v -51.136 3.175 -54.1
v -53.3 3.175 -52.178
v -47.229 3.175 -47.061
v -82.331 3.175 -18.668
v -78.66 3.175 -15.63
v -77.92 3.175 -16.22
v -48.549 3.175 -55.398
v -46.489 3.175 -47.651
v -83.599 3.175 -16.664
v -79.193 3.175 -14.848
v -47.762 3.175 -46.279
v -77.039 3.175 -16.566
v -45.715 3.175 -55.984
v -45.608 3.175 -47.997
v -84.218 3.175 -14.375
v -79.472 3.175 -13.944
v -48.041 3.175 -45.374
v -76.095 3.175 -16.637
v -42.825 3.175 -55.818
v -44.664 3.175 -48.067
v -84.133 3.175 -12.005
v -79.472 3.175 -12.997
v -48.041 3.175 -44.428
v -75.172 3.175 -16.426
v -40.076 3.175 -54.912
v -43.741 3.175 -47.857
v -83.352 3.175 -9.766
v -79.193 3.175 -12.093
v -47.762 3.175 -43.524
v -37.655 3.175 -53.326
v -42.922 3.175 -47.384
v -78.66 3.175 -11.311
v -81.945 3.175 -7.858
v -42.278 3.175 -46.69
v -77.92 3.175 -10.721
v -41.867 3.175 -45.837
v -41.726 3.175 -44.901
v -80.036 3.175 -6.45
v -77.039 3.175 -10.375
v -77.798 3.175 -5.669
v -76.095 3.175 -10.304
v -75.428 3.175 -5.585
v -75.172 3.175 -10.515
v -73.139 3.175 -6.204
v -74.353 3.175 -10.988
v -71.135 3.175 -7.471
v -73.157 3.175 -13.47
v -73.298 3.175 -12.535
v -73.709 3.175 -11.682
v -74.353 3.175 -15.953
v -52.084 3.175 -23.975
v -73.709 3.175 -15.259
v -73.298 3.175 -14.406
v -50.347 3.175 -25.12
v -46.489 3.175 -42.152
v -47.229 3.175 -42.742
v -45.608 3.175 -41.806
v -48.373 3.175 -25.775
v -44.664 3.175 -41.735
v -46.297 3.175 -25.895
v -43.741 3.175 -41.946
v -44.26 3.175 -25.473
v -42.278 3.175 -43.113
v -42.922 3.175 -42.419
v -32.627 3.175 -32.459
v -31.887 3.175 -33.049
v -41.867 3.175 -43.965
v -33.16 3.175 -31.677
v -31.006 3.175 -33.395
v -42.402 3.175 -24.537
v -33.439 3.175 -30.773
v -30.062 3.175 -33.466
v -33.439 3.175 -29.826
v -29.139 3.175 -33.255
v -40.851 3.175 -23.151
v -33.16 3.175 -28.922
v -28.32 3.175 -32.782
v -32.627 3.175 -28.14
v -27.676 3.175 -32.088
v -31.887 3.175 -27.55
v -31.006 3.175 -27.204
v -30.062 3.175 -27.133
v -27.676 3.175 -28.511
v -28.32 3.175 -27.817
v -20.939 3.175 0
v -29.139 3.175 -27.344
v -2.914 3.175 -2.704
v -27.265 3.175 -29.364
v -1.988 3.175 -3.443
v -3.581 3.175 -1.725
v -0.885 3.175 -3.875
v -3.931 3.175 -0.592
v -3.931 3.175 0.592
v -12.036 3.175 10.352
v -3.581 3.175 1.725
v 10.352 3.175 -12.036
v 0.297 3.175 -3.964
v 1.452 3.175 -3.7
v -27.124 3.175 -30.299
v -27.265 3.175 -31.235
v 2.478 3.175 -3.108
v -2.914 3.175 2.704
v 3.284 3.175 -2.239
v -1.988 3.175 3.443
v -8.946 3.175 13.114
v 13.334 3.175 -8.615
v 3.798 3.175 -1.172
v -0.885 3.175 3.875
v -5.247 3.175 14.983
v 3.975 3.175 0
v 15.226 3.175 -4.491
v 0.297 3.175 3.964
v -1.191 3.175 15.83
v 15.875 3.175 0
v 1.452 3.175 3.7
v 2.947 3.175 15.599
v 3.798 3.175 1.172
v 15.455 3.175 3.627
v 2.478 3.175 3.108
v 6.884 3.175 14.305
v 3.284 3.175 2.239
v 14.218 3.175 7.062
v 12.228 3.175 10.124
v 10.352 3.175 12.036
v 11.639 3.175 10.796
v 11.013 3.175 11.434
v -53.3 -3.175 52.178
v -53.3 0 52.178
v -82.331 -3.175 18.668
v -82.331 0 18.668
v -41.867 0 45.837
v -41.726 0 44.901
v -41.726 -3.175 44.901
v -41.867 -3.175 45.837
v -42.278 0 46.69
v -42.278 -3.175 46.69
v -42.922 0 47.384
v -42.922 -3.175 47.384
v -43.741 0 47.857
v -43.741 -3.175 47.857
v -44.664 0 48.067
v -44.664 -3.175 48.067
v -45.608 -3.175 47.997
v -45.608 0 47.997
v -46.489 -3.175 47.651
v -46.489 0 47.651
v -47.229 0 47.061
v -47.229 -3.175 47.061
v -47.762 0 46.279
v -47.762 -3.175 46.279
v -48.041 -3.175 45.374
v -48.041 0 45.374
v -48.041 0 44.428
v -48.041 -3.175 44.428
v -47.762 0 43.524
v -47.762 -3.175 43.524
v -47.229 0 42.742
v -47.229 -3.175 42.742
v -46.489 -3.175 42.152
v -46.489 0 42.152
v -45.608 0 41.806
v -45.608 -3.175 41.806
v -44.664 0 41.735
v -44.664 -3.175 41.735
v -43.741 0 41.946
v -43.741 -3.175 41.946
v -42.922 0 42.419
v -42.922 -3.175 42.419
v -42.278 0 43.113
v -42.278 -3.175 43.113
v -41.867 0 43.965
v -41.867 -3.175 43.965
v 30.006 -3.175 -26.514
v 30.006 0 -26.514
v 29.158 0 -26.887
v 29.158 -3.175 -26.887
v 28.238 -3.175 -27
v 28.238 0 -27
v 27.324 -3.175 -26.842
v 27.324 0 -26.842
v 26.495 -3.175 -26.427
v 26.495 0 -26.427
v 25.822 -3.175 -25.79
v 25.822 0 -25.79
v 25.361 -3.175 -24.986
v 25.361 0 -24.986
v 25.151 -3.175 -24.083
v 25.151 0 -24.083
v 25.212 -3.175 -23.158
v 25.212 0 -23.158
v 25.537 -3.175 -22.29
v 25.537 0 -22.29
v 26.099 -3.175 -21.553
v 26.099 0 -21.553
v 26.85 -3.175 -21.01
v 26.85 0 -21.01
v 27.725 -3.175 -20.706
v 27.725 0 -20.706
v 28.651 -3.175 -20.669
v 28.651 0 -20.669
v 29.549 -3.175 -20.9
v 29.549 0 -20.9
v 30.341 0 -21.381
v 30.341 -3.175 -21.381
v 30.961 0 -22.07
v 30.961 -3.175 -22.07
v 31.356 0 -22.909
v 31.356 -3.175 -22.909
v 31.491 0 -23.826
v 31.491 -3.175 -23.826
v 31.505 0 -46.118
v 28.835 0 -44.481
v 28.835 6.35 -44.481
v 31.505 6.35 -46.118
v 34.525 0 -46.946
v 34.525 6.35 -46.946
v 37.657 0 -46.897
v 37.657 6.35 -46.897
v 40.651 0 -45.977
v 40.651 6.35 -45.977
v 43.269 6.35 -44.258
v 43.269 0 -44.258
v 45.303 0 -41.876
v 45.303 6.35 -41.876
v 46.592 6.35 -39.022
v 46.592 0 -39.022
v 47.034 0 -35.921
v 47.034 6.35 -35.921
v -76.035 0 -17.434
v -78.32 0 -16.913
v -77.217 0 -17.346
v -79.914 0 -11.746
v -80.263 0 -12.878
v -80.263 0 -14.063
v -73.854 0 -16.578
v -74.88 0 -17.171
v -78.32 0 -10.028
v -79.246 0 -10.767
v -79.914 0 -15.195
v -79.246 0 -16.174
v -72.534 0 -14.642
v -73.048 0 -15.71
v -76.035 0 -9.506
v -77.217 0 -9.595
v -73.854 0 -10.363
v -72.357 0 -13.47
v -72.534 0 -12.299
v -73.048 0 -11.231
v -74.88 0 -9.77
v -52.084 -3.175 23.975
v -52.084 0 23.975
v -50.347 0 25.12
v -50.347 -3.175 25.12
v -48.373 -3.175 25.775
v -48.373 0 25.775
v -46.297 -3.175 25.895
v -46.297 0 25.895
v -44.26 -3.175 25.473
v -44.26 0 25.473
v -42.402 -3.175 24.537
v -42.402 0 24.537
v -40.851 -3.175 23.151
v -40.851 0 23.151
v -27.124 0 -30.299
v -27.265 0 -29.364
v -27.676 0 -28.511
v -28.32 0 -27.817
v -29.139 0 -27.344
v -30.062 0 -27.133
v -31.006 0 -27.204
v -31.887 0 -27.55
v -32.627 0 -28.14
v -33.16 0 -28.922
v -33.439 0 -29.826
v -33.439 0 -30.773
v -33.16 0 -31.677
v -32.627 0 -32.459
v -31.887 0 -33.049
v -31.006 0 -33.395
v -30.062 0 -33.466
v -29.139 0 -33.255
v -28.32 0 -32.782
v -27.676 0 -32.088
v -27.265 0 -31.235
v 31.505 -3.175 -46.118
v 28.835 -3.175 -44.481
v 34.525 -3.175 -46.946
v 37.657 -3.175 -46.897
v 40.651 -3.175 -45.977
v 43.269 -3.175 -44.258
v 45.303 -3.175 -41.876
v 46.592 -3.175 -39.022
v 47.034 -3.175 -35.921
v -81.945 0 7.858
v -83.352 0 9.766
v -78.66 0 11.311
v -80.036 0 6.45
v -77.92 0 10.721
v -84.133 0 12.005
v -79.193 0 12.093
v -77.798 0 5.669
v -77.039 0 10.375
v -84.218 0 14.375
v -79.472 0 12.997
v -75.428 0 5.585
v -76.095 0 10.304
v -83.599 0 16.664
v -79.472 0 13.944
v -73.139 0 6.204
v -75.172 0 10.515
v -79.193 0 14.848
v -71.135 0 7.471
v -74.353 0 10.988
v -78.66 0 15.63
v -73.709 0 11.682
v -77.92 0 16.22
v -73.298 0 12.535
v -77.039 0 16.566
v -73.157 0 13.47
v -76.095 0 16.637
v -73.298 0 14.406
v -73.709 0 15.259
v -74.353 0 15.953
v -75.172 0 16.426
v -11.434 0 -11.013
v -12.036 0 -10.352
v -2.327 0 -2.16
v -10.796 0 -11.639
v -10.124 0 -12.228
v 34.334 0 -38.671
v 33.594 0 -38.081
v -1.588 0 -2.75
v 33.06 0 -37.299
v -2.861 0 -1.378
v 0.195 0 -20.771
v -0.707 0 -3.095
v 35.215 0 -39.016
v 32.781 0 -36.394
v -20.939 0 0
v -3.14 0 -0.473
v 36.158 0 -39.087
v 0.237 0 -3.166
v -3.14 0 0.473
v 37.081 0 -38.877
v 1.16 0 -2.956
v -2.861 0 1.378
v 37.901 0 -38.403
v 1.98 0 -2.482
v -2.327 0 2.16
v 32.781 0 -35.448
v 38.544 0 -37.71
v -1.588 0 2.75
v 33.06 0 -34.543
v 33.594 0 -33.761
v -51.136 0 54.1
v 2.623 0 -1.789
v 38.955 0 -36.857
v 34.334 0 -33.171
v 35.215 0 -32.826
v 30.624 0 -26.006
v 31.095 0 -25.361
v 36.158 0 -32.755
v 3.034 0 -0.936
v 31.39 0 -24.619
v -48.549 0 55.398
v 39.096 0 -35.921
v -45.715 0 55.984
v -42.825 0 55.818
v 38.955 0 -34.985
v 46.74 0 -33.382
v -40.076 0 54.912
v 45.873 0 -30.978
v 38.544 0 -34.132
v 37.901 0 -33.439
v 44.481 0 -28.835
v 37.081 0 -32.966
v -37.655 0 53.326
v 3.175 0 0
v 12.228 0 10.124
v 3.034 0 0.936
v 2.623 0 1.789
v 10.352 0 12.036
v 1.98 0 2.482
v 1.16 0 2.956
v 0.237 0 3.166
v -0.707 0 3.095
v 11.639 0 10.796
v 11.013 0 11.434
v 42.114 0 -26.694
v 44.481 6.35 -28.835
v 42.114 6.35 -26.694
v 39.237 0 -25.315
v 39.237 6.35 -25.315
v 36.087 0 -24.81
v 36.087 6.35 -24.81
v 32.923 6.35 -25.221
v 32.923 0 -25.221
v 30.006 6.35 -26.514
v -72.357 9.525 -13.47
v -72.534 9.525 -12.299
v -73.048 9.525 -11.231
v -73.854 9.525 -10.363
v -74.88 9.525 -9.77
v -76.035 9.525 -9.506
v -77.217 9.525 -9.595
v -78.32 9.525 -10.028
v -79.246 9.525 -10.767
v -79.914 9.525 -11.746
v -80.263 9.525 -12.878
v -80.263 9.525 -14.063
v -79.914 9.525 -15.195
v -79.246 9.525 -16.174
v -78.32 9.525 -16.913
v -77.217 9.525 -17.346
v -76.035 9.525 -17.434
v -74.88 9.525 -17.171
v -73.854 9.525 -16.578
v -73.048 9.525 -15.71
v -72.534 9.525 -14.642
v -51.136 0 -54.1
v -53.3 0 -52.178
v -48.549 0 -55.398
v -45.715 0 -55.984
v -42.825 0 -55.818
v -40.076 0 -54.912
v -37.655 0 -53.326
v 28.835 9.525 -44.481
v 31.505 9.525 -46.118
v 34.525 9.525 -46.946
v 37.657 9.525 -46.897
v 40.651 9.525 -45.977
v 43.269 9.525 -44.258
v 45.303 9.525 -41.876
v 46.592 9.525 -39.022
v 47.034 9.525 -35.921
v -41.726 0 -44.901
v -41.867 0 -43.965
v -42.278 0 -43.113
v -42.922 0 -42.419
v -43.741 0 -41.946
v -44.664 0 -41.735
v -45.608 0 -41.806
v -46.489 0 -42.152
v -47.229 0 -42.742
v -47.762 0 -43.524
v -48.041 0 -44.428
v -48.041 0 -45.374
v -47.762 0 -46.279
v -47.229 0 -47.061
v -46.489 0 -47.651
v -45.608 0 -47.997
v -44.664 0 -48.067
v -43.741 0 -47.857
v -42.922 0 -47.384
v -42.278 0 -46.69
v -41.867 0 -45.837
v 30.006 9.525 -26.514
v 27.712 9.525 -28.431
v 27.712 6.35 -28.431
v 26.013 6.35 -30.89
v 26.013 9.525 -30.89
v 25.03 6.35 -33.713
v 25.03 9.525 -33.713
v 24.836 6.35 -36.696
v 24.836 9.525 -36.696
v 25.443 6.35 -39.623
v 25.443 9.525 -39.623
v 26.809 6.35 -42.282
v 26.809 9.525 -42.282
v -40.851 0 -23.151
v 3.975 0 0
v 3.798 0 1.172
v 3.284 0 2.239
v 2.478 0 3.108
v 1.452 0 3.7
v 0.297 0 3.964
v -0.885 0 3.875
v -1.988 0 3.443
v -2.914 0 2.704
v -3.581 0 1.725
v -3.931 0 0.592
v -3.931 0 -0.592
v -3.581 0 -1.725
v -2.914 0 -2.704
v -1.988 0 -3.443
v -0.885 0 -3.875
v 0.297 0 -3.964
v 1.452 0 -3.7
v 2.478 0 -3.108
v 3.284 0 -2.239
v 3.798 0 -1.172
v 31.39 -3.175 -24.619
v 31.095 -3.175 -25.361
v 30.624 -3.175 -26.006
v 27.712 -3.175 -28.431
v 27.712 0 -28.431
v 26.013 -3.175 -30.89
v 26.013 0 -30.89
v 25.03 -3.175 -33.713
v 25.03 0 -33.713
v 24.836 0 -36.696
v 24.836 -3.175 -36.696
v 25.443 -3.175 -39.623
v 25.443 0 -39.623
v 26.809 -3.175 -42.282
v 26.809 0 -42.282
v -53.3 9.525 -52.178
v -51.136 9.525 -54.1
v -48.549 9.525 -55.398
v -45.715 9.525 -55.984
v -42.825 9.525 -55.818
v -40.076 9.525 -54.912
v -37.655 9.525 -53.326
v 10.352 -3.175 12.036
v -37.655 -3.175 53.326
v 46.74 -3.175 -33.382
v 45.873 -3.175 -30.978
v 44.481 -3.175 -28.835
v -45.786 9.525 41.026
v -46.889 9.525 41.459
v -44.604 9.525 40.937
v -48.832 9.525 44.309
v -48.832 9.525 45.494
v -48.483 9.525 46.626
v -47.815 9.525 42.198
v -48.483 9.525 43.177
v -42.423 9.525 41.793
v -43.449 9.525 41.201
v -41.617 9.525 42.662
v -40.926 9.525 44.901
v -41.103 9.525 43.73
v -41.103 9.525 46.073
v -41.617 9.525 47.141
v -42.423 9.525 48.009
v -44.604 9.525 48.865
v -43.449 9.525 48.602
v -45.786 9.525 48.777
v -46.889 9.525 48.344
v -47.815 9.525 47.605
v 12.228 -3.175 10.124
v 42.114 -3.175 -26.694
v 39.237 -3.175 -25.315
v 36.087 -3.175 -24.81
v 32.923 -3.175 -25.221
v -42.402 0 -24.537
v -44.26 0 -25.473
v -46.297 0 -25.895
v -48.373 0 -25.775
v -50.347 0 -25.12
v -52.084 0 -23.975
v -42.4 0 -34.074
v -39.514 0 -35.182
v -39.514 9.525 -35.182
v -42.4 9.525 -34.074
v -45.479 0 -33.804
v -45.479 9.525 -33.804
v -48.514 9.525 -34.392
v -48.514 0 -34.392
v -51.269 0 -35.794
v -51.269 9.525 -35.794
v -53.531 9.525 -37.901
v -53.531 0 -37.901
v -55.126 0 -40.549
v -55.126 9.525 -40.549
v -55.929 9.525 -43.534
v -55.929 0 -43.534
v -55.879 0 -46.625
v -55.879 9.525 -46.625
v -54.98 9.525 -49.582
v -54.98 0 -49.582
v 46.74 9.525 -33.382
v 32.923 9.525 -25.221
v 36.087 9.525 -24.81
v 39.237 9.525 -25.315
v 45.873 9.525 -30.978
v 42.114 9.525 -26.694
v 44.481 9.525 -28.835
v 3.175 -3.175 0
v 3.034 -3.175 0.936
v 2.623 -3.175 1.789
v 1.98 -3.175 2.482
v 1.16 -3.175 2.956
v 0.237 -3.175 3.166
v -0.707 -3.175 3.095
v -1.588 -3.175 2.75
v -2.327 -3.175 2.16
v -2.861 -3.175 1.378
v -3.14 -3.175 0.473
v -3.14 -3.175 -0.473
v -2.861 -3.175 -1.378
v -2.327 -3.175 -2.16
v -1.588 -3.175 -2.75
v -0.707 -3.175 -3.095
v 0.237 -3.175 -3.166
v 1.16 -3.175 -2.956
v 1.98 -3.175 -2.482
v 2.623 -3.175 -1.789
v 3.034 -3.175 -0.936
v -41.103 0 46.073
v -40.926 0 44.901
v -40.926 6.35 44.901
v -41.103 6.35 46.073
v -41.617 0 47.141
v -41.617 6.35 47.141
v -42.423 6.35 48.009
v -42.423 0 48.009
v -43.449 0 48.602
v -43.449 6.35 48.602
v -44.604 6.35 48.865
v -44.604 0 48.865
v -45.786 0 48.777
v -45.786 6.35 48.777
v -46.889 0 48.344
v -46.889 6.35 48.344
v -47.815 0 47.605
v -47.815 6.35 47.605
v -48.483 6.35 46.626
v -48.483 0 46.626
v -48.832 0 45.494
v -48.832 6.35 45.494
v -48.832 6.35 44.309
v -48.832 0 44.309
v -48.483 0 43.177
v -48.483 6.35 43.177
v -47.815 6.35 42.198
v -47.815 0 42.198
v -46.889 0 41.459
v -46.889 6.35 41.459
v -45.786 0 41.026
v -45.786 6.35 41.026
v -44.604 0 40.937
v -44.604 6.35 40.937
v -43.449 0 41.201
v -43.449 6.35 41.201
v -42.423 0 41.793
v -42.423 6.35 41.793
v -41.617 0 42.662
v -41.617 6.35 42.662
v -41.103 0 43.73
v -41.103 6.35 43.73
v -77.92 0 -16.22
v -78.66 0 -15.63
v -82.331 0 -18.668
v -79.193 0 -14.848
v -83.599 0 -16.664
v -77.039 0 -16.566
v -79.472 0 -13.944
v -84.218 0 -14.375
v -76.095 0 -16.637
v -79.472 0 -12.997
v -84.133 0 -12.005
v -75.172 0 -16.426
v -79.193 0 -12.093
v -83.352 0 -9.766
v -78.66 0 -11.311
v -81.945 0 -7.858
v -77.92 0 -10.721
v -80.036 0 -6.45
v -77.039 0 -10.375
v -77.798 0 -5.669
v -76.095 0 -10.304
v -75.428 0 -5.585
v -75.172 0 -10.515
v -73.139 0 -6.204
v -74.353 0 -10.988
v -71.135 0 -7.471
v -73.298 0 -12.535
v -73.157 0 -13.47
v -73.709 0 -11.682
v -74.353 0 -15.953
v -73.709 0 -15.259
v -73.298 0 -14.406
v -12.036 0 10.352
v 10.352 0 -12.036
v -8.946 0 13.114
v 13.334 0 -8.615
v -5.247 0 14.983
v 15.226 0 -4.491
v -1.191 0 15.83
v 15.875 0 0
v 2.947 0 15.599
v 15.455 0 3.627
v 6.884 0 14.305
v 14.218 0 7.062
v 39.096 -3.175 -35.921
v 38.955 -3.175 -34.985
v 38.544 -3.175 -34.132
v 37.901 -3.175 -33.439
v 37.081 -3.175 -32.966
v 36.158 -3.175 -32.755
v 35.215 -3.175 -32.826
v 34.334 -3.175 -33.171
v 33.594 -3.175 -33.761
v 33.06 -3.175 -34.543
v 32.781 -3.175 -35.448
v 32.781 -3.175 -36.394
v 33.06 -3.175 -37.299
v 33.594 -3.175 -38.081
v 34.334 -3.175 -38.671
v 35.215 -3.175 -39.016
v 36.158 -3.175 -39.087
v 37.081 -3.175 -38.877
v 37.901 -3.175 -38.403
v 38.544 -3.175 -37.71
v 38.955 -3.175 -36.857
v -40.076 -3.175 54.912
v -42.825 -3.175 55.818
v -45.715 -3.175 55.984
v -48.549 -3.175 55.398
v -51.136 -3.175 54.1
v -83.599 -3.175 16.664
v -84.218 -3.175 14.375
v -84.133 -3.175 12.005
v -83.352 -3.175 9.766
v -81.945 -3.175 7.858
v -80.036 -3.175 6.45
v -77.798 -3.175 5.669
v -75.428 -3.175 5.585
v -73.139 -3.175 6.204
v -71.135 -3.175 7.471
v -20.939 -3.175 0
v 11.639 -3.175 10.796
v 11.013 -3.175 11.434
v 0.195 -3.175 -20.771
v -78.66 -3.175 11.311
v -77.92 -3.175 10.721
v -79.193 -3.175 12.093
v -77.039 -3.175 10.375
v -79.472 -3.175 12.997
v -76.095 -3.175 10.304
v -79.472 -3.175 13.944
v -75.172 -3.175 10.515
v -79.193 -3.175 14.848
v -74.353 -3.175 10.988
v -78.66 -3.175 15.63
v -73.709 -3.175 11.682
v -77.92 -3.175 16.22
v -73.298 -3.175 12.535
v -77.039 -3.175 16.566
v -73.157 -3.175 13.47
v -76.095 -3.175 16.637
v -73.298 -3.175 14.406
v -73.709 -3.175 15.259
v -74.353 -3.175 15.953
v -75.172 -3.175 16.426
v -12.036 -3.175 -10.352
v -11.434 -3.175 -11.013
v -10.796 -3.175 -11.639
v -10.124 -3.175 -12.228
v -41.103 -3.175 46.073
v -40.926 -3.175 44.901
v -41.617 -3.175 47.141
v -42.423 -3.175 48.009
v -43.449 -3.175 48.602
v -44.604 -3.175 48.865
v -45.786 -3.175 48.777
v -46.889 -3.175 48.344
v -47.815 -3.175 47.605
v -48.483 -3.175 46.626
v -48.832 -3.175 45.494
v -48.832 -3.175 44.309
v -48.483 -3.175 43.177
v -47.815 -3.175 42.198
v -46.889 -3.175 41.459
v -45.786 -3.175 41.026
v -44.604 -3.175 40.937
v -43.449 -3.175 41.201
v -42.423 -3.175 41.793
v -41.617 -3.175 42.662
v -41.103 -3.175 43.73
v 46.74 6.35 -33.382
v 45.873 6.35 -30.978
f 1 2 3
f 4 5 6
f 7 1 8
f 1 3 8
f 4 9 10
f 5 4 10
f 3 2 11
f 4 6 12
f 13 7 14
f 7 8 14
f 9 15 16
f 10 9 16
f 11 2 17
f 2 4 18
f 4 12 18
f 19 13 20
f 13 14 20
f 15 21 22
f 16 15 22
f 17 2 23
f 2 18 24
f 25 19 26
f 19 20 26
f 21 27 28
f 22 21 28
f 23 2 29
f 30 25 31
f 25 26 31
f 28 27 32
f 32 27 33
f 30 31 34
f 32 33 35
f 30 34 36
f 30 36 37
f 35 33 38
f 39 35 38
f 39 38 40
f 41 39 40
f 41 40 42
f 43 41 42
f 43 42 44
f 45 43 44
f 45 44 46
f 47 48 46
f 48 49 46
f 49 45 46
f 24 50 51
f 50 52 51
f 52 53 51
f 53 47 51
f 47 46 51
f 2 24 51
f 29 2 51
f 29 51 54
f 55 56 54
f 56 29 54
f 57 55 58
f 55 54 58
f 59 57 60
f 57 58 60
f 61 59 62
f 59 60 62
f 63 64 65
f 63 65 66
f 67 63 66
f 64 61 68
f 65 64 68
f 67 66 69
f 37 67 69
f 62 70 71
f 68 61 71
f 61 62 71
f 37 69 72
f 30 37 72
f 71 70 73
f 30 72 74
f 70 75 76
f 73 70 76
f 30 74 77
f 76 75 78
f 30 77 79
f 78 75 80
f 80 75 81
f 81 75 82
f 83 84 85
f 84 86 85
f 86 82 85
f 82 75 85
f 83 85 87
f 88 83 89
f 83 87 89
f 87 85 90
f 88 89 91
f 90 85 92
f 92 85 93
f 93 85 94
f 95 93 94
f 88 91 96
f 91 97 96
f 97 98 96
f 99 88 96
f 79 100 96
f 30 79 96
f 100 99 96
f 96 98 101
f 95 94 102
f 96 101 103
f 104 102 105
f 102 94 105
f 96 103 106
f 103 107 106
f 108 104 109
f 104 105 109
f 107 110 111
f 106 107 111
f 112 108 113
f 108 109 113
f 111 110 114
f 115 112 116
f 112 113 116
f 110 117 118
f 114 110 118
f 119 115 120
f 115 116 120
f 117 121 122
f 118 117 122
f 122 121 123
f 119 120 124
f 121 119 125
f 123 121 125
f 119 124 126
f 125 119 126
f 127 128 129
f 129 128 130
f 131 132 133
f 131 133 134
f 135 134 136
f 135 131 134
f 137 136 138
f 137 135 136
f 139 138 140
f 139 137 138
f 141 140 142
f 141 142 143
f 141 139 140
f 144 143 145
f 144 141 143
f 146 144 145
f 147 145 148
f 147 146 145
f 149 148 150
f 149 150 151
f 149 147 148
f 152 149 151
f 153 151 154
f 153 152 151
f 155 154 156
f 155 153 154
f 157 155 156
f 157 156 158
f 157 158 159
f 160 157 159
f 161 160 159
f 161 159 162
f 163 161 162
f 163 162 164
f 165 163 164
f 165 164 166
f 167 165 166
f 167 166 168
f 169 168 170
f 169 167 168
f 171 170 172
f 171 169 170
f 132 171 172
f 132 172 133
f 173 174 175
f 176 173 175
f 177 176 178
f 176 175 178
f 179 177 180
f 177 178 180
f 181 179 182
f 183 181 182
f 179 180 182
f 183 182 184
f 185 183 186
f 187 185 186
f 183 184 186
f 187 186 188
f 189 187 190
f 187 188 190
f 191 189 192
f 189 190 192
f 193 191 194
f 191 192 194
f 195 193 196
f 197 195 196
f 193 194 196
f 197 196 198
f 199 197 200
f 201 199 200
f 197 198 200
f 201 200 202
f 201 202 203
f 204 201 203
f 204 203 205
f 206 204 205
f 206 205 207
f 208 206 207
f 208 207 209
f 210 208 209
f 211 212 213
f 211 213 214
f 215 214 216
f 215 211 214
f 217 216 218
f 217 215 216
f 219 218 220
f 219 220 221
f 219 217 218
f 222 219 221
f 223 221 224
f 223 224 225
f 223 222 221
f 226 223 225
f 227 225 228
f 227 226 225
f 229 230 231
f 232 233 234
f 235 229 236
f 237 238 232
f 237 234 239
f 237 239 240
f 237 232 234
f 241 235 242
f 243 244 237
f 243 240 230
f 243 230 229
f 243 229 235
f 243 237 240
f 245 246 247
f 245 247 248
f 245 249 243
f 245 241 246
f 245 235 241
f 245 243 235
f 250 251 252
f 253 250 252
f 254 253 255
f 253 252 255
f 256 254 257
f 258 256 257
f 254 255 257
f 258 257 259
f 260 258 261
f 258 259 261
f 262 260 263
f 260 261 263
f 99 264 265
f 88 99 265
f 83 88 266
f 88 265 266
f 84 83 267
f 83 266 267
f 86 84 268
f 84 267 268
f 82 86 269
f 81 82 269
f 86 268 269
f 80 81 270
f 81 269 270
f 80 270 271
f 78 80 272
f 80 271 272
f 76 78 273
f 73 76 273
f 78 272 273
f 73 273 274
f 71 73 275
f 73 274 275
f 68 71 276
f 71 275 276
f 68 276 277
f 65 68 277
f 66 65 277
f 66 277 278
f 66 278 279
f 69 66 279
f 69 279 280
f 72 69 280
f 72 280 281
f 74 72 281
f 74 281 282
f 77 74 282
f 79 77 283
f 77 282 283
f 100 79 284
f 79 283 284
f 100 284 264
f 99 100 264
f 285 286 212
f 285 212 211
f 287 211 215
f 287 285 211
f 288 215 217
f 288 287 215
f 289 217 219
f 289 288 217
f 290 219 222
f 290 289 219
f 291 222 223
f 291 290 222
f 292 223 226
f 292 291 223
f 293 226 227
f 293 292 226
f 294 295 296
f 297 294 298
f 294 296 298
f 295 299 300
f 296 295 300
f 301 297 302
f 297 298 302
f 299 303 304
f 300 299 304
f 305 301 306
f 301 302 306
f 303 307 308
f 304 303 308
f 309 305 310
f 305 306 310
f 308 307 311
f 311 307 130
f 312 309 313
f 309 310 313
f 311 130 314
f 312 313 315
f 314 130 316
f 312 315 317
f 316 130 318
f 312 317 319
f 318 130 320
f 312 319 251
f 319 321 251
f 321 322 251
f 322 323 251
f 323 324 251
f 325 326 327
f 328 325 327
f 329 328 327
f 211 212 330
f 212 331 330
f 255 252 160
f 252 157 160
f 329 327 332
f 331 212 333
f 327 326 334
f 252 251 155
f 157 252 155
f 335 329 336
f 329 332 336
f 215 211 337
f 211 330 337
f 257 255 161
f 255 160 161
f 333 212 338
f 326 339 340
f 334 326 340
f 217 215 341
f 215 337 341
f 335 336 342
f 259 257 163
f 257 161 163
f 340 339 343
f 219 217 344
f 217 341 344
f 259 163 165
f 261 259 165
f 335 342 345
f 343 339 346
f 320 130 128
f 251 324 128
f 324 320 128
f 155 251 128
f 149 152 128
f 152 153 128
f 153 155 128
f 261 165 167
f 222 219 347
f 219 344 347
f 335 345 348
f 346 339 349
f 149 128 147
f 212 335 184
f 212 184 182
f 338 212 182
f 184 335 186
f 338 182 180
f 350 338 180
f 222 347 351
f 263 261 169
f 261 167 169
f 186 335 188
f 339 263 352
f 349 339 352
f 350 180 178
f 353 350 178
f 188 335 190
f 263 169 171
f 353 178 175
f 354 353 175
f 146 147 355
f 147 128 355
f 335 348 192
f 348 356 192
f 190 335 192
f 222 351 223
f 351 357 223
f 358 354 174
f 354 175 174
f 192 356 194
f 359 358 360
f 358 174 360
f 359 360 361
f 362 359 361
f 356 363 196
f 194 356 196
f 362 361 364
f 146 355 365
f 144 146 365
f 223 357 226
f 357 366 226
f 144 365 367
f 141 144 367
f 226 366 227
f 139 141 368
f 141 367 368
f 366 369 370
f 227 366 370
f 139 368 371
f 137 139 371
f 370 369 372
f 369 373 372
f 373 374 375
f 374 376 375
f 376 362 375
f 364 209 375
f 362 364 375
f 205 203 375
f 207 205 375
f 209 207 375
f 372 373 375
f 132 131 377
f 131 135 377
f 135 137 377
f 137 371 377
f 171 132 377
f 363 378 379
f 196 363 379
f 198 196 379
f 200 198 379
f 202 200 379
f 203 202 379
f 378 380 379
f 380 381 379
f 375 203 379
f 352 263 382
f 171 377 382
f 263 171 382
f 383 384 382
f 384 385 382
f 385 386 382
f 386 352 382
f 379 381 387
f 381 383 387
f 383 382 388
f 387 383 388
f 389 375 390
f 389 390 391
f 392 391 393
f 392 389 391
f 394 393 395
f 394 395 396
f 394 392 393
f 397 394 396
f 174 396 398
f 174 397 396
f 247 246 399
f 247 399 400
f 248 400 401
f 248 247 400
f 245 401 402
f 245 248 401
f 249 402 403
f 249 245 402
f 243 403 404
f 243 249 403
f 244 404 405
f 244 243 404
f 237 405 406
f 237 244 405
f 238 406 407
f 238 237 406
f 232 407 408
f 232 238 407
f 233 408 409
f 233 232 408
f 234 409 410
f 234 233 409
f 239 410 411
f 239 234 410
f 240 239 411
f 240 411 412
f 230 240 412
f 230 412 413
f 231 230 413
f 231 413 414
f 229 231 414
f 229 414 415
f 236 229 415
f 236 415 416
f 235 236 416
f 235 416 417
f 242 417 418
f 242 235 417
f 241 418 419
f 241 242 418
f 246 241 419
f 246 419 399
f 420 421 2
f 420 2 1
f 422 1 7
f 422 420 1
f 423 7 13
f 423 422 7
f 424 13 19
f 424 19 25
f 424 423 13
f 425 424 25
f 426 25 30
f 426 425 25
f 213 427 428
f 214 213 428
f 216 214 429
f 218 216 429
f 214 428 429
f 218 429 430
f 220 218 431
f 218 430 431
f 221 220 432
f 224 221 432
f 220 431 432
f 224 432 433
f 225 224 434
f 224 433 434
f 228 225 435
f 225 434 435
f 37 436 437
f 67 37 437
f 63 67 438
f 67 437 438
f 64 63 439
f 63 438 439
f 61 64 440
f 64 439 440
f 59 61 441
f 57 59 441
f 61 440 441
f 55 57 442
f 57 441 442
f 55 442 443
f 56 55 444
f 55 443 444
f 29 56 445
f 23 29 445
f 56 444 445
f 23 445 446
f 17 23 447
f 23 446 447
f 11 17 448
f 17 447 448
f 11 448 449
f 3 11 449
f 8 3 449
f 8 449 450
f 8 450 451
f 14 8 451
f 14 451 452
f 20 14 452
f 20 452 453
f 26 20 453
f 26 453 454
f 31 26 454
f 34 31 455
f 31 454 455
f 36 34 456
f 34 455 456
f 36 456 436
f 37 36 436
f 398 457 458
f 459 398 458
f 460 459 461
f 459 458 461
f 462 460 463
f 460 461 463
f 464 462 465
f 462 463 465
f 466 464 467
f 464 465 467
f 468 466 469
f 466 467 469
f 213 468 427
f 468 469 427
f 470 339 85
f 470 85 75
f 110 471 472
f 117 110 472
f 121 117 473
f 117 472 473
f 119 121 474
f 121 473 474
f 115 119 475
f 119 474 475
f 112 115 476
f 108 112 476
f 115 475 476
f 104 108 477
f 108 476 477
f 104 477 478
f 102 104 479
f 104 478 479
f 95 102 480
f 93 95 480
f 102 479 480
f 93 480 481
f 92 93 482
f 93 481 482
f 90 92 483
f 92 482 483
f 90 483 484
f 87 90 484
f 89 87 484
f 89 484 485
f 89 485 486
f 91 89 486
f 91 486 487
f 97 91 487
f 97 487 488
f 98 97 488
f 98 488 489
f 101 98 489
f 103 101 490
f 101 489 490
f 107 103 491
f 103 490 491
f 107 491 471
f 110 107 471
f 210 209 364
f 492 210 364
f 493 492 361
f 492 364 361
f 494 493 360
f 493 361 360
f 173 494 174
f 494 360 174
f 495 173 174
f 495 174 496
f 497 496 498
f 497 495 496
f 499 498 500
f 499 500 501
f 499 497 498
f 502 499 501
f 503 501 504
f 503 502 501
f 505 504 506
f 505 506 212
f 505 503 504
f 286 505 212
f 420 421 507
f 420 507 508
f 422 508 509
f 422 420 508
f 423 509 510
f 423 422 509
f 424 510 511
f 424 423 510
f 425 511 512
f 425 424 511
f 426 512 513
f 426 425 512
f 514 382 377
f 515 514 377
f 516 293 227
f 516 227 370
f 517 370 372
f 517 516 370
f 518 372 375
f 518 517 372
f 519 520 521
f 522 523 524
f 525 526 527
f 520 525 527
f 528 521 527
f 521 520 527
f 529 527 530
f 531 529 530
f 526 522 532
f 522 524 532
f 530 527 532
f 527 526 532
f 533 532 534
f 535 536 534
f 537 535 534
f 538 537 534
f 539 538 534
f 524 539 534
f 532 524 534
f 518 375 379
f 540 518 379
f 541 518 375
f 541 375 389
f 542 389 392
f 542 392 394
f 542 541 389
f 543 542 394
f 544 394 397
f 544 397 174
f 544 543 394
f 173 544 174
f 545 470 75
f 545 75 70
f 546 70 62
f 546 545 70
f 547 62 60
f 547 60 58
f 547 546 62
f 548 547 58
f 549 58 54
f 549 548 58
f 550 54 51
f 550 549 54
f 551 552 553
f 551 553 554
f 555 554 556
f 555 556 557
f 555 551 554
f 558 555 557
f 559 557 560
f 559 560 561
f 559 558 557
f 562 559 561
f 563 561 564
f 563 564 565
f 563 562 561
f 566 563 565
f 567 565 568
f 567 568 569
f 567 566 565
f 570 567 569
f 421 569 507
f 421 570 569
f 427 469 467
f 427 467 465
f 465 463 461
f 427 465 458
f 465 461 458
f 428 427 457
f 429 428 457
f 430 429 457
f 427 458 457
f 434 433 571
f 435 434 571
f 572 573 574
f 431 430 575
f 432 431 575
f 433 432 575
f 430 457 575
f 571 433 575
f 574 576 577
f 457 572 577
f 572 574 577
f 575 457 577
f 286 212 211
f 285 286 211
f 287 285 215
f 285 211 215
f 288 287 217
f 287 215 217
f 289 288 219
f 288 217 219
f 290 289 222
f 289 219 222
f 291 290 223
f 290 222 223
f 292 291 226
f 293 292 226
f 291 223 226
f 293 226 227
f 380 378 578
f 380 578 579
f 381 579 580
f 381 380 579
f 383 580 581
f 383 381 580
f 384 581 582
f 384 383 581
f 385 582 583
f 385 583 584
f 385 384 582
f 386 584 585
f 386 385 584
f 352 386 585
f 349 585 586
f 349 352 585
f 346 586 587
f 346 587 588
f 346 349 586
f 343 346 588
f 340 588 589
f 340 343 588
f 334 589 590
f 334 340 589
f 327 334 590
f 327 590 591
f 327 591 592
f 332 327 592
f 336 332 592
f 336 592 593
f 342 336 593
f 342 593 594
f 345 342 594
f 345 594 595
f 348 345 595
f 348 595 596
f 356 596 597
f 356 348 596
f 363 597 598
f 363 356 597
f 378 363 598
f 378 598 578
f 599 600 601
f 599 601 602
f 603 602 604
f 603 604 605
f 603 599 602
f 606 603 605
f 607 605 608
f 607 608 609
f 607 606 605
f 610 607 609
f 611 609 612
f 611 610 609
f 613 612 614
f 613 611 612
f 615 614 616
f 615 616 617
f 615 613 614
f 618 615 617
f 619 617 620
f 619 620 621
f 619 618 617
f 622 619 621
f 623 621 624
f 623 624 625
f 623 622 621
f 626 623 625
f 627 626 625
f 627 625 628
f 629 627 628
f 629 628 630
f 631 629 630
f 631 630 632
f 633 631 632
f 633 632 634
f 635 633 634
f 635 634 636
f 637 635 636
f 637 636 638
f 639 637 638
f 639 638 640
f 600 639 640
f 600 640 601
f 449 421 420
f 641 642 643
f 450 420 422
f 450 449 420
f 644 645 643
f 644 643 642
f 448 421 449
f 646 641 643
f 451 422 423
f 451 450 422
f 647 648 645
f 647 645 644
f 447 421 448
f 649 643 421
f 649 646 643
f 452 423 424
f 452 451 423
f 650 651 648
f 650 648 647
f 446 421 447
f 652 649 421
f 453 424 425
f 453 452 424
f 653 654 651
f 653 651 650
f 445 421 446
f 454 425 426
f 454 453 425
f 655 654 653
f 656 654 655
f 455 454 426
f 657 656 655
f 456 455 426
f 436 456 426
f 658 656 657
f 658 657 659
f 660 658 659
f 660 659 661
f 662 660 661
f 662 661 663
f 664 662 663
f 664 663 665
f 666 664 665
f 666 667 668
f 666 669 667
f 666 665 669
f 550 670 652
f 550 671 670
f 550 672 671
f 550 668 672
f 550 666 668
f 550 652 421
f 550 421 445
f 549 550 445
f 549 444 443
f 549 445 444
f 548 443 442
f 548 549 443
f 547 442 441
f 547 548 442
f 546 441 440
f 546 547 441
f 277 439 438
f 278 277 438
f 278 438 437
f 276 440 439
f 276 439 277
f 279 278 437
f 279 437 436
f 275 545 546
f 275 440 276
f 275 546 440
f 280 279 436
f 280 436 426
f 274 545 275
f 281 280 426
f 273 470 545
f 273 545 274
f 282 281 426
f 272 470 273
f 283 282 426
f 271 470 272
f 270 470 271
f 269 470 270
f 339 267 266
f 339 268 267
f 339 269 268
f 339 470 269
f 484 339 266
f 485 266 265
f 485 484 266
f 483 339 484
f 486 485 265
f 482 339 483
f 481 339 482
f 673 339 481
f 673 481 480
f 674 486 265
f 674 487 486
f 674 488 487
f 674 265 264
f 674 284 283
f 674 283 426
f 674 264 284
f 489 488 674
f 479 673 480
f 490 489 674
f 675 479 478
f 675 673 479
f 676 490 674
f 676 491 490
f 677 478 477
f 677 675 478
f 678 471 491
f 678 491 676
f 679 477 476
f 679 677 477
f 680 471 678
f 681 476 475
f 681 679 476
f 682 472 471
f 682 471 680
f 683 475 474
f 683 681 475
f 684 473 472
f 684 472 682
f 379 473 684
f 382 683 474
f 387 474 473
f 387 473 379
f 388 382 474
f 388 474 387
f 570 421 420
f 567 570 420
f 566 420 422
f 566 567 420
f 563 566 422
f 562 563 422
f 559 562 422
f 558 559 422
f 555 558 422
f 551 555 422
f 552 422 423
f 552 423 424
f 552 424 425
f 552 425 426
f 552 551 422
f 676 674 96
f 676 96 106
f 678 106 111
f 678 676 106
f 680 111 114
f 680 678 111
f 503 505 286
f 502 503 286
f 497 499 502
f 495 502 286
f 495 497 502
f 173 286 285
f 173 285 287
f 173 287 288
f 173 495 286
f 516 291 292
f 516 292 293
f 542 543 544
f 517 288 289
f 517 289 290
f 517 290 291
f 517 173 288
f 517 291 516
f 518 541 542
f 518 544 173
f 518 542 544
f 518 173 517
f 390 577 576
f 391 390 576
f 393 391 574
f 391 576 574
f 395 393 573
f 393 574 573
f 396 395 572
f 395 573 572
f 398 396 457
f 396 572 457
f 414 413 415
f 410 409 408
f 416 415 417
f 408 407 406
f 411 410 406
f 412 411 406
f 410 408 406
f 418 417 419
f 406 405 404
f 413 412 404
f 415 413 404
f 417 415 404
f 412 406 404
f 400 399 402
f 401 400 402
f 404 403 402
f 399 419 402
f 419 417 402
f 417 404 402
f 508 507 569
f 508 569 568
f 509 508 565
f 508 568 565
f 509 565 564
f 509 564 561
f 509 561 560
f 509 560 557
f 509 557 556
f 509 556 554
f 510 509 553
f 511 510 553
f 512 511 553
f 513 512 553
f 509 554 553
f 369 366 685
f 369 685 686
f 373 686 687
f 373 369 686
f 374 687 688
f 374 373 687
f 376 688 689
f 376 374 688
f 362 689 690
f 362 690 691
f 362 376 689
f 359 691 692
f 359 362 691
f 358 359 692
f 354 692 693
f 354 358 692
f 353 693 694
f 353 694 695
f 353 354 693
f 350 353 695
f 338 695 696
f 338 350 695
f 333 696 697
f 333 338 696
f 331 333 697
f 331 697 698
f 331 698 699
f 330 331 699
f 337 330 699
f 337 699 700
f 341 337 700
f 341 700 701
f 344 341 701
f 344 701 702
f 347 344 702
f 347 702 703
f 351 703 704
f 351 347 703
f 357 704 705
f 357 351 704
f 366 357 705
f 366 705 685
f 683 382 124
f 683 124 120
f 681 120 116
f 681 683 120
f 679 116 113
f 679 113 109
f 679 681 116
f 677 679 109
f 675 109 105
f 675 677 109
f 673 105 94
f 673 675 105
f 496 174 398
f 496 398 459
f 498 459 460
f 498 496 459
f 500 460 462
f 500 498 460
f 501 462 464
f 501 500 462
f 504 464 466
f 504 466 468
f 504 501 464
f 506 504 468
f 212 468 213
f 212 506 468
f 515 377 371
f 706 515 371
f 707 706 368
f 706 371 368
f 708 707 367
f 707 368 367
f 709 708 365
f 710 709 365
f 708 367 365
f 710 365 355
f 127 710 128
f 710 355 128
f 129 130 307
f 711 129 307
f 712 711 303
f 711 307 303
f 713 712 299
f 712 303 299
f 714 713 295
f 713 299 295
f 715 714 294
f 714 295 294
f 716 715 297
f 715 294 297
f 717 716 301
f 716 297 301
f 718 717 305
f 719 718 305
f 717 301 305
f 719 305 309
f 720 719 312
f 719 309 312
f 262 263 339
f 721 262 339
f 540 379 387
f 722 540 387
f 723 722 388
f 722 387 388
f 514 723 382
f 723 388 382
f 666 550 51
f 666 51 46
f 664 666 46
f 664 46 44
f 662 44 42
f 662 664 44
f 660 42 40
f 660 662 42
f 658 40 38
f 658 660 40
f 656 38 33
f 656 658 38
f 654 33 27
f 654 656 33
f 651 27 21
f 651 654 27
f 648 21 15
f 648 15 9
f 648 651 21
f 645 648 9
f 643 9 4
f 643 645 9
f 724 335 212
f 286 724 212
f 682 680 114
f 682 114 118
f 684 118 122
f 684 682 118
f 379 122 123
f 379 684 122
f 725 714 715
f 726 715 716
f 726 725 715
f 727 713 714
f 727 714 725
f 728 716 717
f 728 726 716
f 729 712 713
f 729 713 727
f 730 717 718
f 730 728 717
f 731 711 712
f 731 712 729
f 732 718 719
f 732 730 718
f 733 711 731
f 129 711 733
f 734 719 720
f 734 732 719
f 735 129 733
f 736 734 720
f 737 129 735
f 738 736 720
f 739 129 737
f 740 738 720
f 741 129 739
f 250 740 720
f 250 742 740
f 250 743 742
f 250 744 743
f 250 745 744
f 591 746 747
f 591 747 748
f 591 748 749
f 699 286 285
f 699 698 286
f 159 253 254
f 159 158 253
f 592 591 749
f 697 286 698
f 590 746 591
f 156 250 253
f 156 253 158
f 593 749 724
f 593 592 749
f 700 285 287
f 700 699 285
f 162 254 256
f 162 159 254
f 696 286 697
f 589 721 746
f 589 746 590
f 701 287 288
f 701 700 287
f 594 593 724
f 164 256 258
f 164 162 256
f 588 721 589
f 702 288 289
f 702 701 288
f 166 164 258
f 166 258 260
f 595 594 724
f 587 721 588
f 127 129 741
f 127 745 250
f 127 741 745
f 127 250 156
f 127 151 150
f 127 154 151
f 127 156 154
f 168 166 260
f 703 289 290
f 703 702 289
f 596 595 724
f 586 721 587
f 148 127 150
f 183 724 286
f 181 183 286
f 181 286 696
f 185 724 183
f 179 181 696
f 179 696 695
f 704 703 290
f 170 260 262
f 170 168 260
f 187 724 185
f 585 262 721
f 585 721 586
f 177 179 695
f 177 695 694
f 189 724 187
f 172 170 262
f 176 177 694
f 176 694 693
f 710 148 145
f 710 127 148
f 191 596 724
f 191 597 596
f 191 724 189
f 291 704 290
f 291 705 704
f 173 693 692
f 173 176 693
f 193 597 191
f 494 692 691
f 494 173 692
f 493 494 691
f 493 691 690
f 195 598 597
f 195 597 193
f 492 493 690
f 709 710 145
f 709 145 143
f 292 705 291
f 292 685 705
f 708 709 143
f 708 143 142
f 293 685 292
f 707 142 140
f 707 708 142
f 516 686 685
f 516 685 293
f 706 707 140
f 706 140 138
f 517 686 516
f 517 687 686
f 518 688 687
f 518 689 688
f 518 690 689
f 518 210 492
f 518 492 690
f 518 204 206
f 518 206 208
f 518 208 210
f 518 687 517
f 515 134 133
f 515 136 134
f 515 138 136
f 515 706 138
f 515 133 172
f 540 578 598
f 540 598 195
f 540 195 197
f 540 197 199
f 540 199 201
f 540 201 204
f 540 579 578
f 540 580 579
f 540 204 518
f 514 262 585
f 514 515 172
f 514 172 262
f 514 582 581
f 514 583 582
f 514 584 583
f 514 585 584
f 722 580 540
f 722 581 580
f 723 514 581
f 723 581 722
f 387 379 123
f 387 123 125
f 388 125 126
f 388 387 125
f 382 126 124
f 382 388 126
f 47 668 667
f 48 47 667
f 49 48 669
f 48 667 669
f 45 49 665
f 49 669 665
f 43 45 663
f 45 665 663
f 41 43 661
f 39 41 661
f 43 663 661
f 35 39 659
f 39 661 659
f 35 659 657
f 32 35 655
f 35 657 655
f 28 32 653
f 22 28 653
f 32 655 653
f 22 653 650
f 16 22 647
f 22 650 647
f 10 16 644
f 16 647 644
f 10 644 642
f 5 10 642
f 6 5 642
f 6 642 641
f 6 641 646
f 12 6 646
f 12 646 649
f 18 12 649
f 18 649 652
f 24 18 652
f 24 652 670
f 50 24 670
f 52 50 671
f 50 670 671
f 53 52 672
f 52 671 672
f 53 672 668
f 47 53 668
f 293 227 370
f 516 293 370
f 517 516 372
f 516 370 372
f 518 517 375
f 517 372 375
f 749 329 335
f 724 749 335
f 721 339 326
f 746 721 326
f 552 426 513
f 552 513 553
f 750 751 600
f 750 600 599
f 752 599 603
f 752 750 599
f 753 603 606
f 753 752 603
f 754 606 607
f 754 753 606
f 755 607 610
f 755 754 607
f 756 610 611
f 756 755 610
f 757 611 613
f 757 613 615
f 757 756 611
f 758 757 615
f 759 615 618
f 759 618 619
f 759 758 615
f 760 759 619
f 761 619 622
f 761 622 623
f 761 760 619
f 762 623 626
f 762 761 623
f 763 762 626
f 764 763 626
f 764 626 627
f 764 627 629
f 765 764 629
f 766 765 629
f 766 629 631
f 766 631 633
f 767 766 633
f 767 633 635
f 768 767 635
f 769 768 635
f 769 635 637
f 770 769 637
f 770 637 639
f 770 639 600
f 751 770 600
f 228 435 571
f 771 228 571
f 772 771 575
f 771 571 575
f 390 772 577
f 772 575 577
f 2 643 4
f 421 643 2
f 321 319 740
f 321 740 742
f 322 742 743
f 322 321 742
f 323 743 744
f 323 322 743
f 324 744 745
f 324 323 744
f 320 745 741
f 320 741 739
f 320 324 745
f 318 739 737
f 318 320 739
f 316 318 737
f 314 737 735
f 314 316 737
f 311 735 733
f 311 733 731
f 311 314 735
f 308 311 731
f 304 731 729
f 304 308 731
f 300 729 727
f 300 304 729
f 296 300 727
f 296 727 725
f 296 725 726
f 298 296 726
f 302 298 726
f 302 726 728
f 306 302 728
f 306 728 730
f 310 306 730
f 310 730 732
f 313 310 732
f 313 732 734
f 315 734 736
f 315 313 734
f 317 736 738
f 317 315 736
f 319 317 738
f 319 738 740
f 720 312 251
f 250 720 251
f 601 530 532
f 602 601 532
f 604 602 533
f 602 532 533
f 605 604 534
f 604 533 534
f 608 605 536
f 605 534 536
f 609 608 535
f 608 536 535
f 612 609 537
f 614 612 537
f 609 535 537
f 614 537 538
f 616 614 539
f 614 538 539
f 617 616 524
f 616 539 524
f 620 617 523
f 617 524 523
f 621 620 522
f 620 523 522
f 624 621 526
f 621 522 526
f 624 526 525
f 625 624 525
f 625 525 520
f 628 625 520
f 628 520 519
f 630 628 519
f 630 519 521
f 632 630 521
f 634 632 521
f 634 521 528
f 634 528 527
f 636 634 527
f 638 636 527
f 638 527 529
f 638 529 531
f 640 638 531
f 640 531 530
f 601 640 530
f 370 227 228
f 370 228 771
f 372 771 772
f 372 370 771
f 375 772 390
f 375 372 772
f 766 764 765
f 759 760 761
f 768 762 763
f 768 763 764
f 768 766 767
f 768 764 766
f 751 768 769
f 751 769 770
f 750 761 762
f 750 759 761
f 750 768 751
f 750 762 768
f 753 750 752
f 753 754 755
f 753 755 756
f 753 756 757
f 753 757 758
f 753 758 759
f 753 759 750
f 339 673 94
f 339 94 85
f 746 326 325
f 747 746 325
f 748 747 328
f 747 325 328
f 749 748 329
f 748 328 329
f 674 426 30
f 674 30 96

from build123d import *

# Parameters (mm, degrees)
F0_R     = 3.175
F0_R_2   = 3.9751
F1_DEPTH = 3.175
F2_DEPTH = 3.175
F4_R     = 3.175
F6_DEPTH = 9.525
F4_R_2   = 3.9751
F3_R     = 3.175
F3_R_2   = 3.9751


# Not quite as in the source:
# - a pattern or mirror of a feature is missing from the dataset's text; its kind, count and spacing are read off the source's solid


with BuildPart() as f1:
    # F0 (on Front) → F1 (new body)
    with BuildSketch(Plane.XZ):
        with BuildLine():
            ThreePointArc((-12.0356034274, 10.3518054047), (-1.190625, 15.8302885984), (10.3518054047, 12.0356034274))
            Line((10.3518054047, 12.0356034274), (-37.655016822, 53.3262030046))
            ThreePointArc((-37.655016822, 53.3262030046), (-34.8014845049, 49.5361241819), (-33.7887806053, 44.9012806053))
            ThreePointArc((-33.7887806053, 44.9012806053), (-48.7842347585, 34.4892527868), (-53.300199871, 52.1776678558))
            Line((-53.300199871, 52.1776678558), (-82.331405076, 18.6678036462))
            ThreePointArc((-82.331405076, 18.6678036462), (-73.5586383483, 20.9075469092), (-68.3946770291, 13.4703841816))
            ThreePointArc((-68.3946770291, 13.4703841816), (-69.1121208226, 10.1727039932), (-71.1347575644, 7.4711561347))
            Line((-71.1347575644, 7.4711561347), (-52.0843267669, 23.9754595323))
            ThreePointArc((-52.0843267669, 23.9754595323), (-46.2965222838, 25.8954961667), (-40.8511612346, 23.1508168672))
            Line((-40.8511612346, 23.1508168672), (-20.9391765456, 0))
            Line((-20.9391765456, 0), (-12.0356034274, 10.3518054047))
        make_face()
        with BuildLine():
            ThreePointArc((-68.3946770291, 13.4703841816), (-73.5586383483, 20.9075469092), (-82.331405076, 18.6678036462))
            ThreePointArc((-82.331405076, 18.6678036462), (-81.9448371048, 7.8577241059), (-71.1347575644, 7.4711561347))
            ThreePointArc((-71.1347575644, 7.4711561347), (-69.1121208226, 10.1727039932), (-68.3946770291, 13.4703841816))
        make_face()
        with Locations((-76.3321770291, 13.4703841816)):
            Circle(F0_R, mode=Mode.SUBTRACT)
        with BuildLine():
            ThreePointArc((-33.7887806053, 44.9012806053), (-34.8014845049, 49.5361241819), (-37.655016822, 53.3262030046))
            ThreePointArc((-37.655016822, 53.3262030046), (-45.7148756595, 55.9839571475), (-53.300199871, 52.1776678558))
            ThreePointArc((-53.300199871, 52.1776678558), (-48.7842347585, 34.4892527868), (-33.7887806053, 44.9012806053))
        make_face()
        with Locations((-44.9012806053, 44.9012806053)):
            Circle(F0_R, mode=Mode.SUBTRACT)
        with BuildLine():
            ThreePointArc((10.3518054047, -12.0356034274), (14.4282801435, -6.6212051093), (15.875, 0))
            ThreePointArc((15.875, 0), (14.9355142785, 5.3801522504), (12.2282550252, 10.1235074968))
            ThreePointArc((12.2282550252, 10.1235074968), (11.3304373246, 11.1192092809), (10.3518054047, 12.0356034274))
            ThreePointArc((10.3518054047, 12.0356034274), (-1.190625, 15.8302885984), (-12.0356034274, 10.3518054047))
            ThreePointArc((-12.0356034274, 10.3518054047), (-15.875, 0), (-12.0356034274, -10.3518054047))
            ThreePointArc((-12.0356034274, -10.3518054047), (-11.1192092809, -11.3304373246), (-10.1235074968, -12.2282550252))
            ThreePointArc((-10.1235074968, -12.2282550252), (0.1493607821, -15.87429735), (10.3518054047, -12.0356034274))
        make_face()
        Circle(F0_R_2, mode=Mode.SUBTRACT)
        with BuildLine():
            Line((0.1954344954, -20.7710836138), (10.3518054047, -12.0356034274))
            ThreePointArc((10.3518054047, -12.0356034274), (0.1493607821, -15.87429735), (-10.1235074968, -12.2282550252))
            Line((-10.1235074968, -12.2282550252), (0.1954344954, -20.7710836138))
        make_face()
        with BuildLine():
            ThreePointArc((-12.0356034274, -10.3518054047), (-15.875, 0), (-12.0356034274, 10.3518054047))
            Line((-12.0356034274, 10.3518054047), (-20.9391765456, 0))
            Line((-20.9391765456, 0), (-12.0356034274, -10.3518054047))
        make_face()
        with BuildLine():
            ThreePointArc((12.2282550252, 10.1235074968), (14.9355142785, 5.3801522504), (15.875, 0))
            ThreePointArc((15.875, 0), (14.4282801435, -6.6212051093), (10.3518054047, -12.0356034274))
            Line((10.3518054047, -12.0356034274), (0.1954344954, -20.7710836138))
            Line((0.1954344954, -20.7710836138), (28.8345692365, -44.4808030019))
            ThreePointArc((28.8345692365, -44.4808030019), (24.8320654939, -35.1980827435), (30.0059353765, -26.5136137301))
            ThreePointArc((30.0059353765, -26.5136137301), (37.6803721288, -24.9486796066), (44.4808030019, -28.8345692365))
            Line((44.4808030019, -28.8345692365), (12.2282550252, 10.1235074968))
        make_face()
        with BuildLine():
            ThreePointArc((31.490910058, -23.8257819975), (31.0949796313, -25.361163809), (30.0059353765, -26.5136137301))
            ThreePointArc((30.0059353765, -26.5136137301), (25.5368404848, -22.290400186), (31.490910058, -23.8257819975))
        make_face(mode=Mode.SUBTRACT)
        with BuildLine():
            ThreePointArc((47.0335244843, -35.9210244843), (46.3758844792, -32.154917909), (44.4808030019, -28.8345692365))
            ThreePointArc((44.4808030019, -28.8345692365), (37.6803721288, -24.9486796066), (30.0059353765, -26.5136137301))
            ThreePointArc((30.0059353765, -26.5136137301), (24.8320654939, -35.1980827435), (28.8345692365, -44.4808030019))
            ThreePointArc((28.8345692365, -44.4808030019), (40.650687385, -45.9767663811), (47.0335244843, -35.9210244843))
        make_face()
        with Locations((35.9210244843, -35.9210244843)):
            Circle(F0_R, mode=Mode.SUBTRACT)
        Circle(F0_R_2)
        Circle(F0_R, mode=Mode.SUBTRACT)
    extrude(amount=F1_DEPTH)


with BuildPart() as f2:
    # F0 (on Front) → F2 (new body)
    with BuildSketch(Plane.XZ):
        with BuildLine():
            Line((0.1954344954, -20.7710836138), (-10.1235074968, -12.2282550252))
            ThreePointArc((-10.1235074968, -12.2282550252), (-11.1192092809, -11.3304373246), (-12.0356034274, -10.3518054047))
            Line((-12.0356034274, -10.3518054047), (-20.9391765456, 0))
            Line((-20.9391765456, 0), (-40.8511612346, -23.1508168672))
            ThreePointArc((-40.8511612346, -23.1508168672), (-46.2965222838, -25.8954961667), (-52.0843267669, -23.9754595323))
            Line((-52.0843267669, -23.9754595323), (-71.1347575644, -7.4711561347))
            ThreePointArc((-71.1347575644, -7.4711561347), (-69.1121208226, -10.1727039932), (-68.3946770291, -13.4703841816))
            ThreePointArc((-68.3946770291, -13.4703841816), (-73.5586383483, -20.9075469092), (-82.331405076, -18.6678036462))
            Line((-82.331405076, -18.6678036462), (-53.300199871, -52.1776678558))
            ThreePointArc((-53.300199871, -52.1776678558), (-48.7842347585, -34.4892527868), (-33.7887806053, -44.9012806053))
            ThreePointArc((-33.7887806053, -44.9012806053), (-34.8014845049, -49.5361241819), (-37.655016822, -53.3262030046))
            Line((-37.655016822, -53.3262030046), (0.1954344954, -20.7710836138))
        make_face()
        with Locations((-30.2993841525, -30.2993841525)):
            Circle(F0_R, mode=Mode.SUBTRACT)
        with BuildLine():
            ThreePointArc((-53.300199871, -52.1776678558), (-45.7148756595, -55.9839571475), (-37.655016822, -53.3262030046))
            ThreePointArc((-37.655016822, -53.3262030046), (-34.8014845049, -49.5361241819), (-33.7887806053, -44.9012806053))
            ThreePointArc((-33.7887806053, -44.9012806053), (-48.7842347585, -34.4892527868), (-53.300199871, -52.1776678558))
        make_face()
        with Locations((-44.9012806053, -44.9012806053)):
            Circle(F0_R, mode=Mode.SUBTRACT)
        with BuildLine():
            ThreePointArc((-71.1347575644, -7.4711561347), (-81.9448371048, -7.8577241059), (-82.331405076, -18.6678036462))
            ThreePointArc((-82.331405076, -18.6678036462), (-73.5586383483, -20.9075469092), (-68.3946770291, -13.4703841816))
            ThreePointArc((-68.3946770291, -13.4703841816), (-69.1121208226, -10.1727039932), (-71.1347575644, -7.4711561347))
        make_face()
        with Locations((-76.3321770291, -13.4703841816)):
            Circle(F0_R, mode=Mode.SUBTRACT)
        with BuildLine():
            ThreePointArc((-12.0356034274, -10.3518054047), (-15.875, 0), (-12.0356034274, 10.3518054047))
            Line((-12.0356034274, 10.3518054047), (-20.9391765456, 0))
            Line((-20.9391765456, 0), (-12.0356034274, -10.3518054047))
        make_face()
        with BuildLine():
            Line((0.1954344954, -20.7710836138), (10.3518054047, -12.0356034274))
            ThreePointArc((10.3518054047, -12.0356034274), (0.1493607821, -15.87429735), (-10.1235074968, -12.2282550252))
            Line((-10.1235074968, -12.2282550252), (0.1954344954, -20.7710836138))
        make_face()
        with BuildLine():
            ThreePointArc((10.3518054047, -12.0356034274), (14.4282801435, -6.6212051093), (15.875, 0))
            ThreePointArc((15.875, 0), (14.9355142785, 5.3801522504), (12.2282550252, 10.1235074968))
            ThreePointArc((12.2282550252, 10.1235074968), (11.3304373246, 11.1192092809), (10.3518054047, 12.0356034274))
            ThreePointArc((10.3518054047, 12.0356034274), (-1.190625, 15.8302885984), (-12.0356034274, 10.3518054047))
            ThreePointArc((-12.0356034274, 10.3518054047), (-15.875, 0), (-12.0356034274, -10.3518054047))
            ThreePointArc((-12.0356034274, -10.3518054047), (-11.1192092809, -11.3304373246), (-10.1235074968, -12.2282550252))
            ThreePointArc((-10.1235074968, -12.2282550252), (0.1493607821, -15.87429735), (10.3518054047, -12.0356034274))
        make_face()
        Circle(F0_R_2, mode=Mode.SUBTRACT)
    extrude(amount=-F2_DEPTH)


with BuildPart() as f6:
    # F4 (on face) → F6 (new body, through all)
    with BuildSketch(Plane.XZ):
        with BuildLine():
            Line((-37.655016822, -53.3262030046), (-39.5136587319, -35.1821660984))
            ThreePointArc((-39.5136587319, -35.1821660984), (-53.5313876726, -37.9006443302), (-53.300199871, -52.1776678558))
            ThreePointArc((-53.300199871, -52.1776678558), (-45.7148756595, -55.9839571475), (-37.655016822, -53.3262030046))
        make_face()
        with Locations((-44.9012806053, -44.9012806053)):
            Circle(F4_R, mode=Mode.SUBTRACT)
        with Locations((-44.9012806053, -44.9012806053)):
            Circle(F4_R)
    extrude(amount=-F6_DEPTH)


with BuildPart() as f6b:
    # F4 (on face) → F6, piece 2 (new body, through all)
    with BuildSketch(Plane.XZ):
        with Locations((-76.3321770291, -13.4703841816)):
            Circle(F4_R_2)
        with Locations((-76.3321770291, -13.4703841816)):
            Circle(F4_R, mode=Mode.SUBTRACT)
        with Locations((-76.3321770291, -13.4703841816)):
            Circle(F4_R)
    extrude(amount=-F6_DEPTH)


with BuildPart() as f6c:
    # F3 (on face) → F6, piece 3 (new body, through all)
    with BuildSketch(Plane.XZ.offset(3.175)):
        with BuildLine():
            ThreePointArc((28.8345692365, -44.4808030019), (40.650687385, -45.9767663811), (47.0335244843, -35.9210244843))
            ThreePointArc((47.0335244843, -35.9210244843), (46.3758844792, -32.154917909), (44.4808030019, -28.8345692365))
            ThreePointArc((44.4808030019, -28.8345692365), (37.6803722871, -24.9486796319), (30.005935648, -26.5136135595))
            ThreePointArc((30.005935648, -26.5136135595), (24.8320655044, -35.1980825835), (28.8345692365, -44.4808030019))
        make_face()
        with Locations((35.9210244843, -35.9210244843)):
            Circle(F3_R, mode=Mode.SUBTRACT)
        with Locations((35.9210244843, -35.9210244843)):
            Circle(F3_R)
    extrude(amount=-F6_DEPTH)

    # F6_3_copies: F6c across plane


with BuildPart() as f6d:
    # F3 (on face) → F6, piece 4 (new body, through all)
    with BuildSketch(Plane.XZ.offset(3.175)):
        with Locations((-44.9012806053, 44.9012806053)):
            Circle(F3_R_2)
        with Locations((-44.9012806053, 44.9012806053)):
            Circle(F3_R, mode=Mode.SUBTRACT)
        with Locations((-44.9012806053, 44.9012806053)):
            Circle(F3_R)
    extrude(amount=-F6_DEPTH)

    # F6_4_copies: F6d across plane


with BuildPart() as f6c_1:
    add(f6c.part)
    add(f6c.part.mirror(Plane.ZX.offset(3.175)))


with BuildPart() as f6d_1:
    add(f6d.part)
    add(f6d.part.mirror(Plane.ZX.offset(3.175)))


solid = Compound([f1.part, f2.part, f6.part, f6b.part, f6c_1.part, f6d_1.part])
